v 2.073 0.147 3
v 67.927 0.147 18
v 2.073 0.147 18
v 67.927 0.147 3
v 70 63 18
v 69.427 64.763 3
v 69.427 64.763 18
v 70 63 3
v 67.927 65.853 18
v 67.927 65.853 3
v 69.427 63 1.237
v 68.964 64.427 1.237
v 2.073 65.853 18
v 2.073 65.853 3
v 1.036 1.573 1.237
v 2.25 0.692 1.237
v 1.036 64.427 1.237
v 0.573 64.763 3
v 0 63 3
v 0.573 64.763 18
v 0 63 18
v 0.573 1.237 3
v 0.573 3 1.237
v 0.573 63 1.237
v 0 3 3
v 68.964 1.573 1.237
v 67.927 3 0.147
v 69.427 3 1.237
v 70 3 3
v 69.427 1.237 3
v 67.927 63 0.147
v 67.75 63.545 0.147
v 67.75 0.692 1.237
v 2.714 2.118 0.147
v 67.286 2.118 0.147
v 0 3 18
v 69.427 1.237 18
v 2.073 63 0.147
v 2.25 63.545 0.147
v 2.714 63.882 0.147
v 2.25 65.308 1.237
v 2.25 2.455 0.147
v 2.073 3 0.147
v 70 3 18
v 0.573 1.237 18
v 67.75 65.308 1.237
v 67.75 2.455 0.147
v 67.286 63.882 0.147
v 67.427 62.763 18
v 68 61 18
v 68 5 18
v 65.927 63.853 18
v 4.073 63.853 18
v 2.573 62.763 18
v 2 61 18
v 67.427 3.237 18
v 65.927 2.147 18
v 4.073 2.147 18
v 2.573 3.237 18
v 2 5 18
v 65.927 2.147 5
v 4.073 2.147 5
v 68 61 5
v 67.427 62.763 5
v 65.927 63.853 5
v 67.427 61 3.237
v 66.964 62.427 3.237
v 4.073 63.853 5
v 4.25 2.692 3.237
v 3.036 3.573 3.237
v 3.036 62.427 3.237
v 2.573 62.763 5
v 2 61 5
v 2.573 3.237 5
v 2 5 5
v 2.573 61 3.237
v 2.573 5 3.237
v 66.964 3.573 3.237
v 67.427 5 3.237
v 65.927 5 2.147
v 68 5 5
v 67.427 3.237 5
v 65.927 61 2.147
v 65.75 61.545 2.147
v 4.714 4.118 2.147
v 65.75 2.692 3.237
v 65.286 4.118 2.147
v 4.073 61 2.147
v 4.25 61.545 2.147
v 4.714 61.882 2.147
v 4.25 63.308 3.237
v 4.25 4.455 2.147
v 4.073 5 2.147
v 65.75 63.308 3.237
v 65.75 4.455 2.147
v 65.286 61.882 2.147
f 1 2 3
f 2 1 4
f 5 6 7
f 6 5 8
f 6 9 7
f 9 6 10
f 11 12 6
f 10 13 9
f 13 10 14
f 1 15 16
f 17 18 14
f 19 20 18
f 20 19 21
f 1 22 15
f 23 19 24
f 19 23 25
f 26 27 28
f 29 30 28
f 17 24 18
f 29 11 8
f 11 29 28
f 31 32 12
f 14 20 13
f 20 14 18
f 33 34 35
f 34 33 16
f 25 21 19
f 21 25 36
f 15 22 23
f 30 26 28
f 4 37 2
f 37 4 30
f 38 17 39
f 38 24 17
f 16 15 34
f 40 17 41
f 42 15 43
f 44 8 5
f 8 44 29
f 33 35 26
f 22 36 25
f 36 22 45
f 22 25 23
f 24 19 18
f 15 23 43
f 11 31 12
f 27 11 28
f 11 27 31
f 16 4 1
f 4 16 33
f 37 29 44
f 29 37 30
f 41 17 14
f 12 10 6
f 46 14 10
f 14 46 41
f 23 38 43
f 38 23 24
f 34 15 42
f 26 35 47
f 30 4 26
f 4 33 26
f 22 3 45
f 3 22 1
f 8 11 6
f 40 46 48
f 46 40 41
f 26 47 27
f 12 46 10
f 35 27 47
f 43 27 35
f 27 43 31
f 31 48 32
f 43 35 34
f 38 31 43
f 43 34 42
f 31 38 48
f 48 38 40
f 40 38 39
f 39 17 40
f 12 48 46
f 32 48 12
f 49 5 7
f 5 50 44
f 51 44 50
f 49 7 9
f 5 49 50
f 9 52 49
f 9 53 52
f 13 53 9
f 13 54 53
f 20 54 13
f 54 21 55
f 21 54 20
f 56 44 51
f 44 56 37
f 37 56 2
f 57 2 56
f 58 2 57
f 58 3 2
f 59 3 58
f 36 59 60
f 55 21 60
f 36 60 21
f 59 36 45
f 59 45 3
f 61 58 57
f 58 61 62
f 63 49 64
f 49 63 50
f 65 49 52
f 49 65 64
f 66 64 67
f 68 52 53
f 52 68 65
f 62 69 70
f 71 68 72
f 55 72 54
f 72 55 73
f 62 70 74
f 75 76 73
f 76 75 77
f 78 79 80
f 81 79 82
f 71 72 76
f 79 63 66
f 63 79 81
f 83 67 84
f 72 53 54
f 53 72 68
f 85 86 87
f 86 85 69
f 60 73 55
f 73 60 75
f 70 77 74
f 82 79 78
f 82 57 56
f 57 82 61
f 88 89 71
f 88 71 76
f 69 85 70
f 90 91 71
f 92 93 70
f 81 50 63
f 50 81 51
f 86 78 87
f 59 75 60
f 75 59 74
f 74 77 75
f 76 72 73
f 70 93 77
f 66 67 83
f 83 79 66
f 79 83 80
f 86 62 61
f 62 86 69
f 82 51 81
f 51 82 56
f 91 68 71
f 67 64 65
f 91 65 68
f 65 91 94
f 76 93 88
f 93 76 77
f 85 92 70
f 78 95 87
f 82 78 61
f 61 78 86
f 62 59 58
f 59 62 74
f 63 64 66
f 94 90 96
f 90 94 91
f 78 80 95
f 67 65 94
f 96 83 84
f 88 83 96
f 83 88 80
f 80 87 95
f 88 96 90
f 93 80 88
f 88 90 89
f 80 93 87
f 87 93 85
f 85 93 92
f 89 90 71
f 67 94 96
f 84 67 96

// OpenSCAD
// Settings
box_length = 70;
box_width = 66;
box_height = 18;
wall_thickness = 2;

rounding = 3;
bleed = 1;

// Derived attributes
r_box_length = box_length-rounding*2;
r_box_width = box_width-rounding*2;
r_box_height = box_height-rounding*2+rounding+bleed;

r_hollow_length = box_length-rounding*2-wall_thickness*2;
r_hollow_width = box_width-rounding*2-wall_thickness*2;
r_hollow_height = box_height-rounding*2+rounding+bleed;
r_hollow_offset = rounding+wall_thickness;

difference() {
  // Base tray
  minkowski() {
    translate([rounding, rounding, rounding]) {
      cube([r_box_length, r_box_width, r_box_height]);
    }
    sphere(rounding);
  }

  // Slice off top
  translate([-bleed,-bleed,box_height]) {
    cube([box_length+bleed*2, box_width+bleed*2, rounding+bleed]);
  }

  // Hollow out tray
  minkowski() {
    translate([r_hollow_offset, r_hollow_offset, r_hollow_offset]) {
      cube([r_hollow_length, r_hollow_width, r_hollow_height]);
    }
    sphere(rounding);
  }
}
